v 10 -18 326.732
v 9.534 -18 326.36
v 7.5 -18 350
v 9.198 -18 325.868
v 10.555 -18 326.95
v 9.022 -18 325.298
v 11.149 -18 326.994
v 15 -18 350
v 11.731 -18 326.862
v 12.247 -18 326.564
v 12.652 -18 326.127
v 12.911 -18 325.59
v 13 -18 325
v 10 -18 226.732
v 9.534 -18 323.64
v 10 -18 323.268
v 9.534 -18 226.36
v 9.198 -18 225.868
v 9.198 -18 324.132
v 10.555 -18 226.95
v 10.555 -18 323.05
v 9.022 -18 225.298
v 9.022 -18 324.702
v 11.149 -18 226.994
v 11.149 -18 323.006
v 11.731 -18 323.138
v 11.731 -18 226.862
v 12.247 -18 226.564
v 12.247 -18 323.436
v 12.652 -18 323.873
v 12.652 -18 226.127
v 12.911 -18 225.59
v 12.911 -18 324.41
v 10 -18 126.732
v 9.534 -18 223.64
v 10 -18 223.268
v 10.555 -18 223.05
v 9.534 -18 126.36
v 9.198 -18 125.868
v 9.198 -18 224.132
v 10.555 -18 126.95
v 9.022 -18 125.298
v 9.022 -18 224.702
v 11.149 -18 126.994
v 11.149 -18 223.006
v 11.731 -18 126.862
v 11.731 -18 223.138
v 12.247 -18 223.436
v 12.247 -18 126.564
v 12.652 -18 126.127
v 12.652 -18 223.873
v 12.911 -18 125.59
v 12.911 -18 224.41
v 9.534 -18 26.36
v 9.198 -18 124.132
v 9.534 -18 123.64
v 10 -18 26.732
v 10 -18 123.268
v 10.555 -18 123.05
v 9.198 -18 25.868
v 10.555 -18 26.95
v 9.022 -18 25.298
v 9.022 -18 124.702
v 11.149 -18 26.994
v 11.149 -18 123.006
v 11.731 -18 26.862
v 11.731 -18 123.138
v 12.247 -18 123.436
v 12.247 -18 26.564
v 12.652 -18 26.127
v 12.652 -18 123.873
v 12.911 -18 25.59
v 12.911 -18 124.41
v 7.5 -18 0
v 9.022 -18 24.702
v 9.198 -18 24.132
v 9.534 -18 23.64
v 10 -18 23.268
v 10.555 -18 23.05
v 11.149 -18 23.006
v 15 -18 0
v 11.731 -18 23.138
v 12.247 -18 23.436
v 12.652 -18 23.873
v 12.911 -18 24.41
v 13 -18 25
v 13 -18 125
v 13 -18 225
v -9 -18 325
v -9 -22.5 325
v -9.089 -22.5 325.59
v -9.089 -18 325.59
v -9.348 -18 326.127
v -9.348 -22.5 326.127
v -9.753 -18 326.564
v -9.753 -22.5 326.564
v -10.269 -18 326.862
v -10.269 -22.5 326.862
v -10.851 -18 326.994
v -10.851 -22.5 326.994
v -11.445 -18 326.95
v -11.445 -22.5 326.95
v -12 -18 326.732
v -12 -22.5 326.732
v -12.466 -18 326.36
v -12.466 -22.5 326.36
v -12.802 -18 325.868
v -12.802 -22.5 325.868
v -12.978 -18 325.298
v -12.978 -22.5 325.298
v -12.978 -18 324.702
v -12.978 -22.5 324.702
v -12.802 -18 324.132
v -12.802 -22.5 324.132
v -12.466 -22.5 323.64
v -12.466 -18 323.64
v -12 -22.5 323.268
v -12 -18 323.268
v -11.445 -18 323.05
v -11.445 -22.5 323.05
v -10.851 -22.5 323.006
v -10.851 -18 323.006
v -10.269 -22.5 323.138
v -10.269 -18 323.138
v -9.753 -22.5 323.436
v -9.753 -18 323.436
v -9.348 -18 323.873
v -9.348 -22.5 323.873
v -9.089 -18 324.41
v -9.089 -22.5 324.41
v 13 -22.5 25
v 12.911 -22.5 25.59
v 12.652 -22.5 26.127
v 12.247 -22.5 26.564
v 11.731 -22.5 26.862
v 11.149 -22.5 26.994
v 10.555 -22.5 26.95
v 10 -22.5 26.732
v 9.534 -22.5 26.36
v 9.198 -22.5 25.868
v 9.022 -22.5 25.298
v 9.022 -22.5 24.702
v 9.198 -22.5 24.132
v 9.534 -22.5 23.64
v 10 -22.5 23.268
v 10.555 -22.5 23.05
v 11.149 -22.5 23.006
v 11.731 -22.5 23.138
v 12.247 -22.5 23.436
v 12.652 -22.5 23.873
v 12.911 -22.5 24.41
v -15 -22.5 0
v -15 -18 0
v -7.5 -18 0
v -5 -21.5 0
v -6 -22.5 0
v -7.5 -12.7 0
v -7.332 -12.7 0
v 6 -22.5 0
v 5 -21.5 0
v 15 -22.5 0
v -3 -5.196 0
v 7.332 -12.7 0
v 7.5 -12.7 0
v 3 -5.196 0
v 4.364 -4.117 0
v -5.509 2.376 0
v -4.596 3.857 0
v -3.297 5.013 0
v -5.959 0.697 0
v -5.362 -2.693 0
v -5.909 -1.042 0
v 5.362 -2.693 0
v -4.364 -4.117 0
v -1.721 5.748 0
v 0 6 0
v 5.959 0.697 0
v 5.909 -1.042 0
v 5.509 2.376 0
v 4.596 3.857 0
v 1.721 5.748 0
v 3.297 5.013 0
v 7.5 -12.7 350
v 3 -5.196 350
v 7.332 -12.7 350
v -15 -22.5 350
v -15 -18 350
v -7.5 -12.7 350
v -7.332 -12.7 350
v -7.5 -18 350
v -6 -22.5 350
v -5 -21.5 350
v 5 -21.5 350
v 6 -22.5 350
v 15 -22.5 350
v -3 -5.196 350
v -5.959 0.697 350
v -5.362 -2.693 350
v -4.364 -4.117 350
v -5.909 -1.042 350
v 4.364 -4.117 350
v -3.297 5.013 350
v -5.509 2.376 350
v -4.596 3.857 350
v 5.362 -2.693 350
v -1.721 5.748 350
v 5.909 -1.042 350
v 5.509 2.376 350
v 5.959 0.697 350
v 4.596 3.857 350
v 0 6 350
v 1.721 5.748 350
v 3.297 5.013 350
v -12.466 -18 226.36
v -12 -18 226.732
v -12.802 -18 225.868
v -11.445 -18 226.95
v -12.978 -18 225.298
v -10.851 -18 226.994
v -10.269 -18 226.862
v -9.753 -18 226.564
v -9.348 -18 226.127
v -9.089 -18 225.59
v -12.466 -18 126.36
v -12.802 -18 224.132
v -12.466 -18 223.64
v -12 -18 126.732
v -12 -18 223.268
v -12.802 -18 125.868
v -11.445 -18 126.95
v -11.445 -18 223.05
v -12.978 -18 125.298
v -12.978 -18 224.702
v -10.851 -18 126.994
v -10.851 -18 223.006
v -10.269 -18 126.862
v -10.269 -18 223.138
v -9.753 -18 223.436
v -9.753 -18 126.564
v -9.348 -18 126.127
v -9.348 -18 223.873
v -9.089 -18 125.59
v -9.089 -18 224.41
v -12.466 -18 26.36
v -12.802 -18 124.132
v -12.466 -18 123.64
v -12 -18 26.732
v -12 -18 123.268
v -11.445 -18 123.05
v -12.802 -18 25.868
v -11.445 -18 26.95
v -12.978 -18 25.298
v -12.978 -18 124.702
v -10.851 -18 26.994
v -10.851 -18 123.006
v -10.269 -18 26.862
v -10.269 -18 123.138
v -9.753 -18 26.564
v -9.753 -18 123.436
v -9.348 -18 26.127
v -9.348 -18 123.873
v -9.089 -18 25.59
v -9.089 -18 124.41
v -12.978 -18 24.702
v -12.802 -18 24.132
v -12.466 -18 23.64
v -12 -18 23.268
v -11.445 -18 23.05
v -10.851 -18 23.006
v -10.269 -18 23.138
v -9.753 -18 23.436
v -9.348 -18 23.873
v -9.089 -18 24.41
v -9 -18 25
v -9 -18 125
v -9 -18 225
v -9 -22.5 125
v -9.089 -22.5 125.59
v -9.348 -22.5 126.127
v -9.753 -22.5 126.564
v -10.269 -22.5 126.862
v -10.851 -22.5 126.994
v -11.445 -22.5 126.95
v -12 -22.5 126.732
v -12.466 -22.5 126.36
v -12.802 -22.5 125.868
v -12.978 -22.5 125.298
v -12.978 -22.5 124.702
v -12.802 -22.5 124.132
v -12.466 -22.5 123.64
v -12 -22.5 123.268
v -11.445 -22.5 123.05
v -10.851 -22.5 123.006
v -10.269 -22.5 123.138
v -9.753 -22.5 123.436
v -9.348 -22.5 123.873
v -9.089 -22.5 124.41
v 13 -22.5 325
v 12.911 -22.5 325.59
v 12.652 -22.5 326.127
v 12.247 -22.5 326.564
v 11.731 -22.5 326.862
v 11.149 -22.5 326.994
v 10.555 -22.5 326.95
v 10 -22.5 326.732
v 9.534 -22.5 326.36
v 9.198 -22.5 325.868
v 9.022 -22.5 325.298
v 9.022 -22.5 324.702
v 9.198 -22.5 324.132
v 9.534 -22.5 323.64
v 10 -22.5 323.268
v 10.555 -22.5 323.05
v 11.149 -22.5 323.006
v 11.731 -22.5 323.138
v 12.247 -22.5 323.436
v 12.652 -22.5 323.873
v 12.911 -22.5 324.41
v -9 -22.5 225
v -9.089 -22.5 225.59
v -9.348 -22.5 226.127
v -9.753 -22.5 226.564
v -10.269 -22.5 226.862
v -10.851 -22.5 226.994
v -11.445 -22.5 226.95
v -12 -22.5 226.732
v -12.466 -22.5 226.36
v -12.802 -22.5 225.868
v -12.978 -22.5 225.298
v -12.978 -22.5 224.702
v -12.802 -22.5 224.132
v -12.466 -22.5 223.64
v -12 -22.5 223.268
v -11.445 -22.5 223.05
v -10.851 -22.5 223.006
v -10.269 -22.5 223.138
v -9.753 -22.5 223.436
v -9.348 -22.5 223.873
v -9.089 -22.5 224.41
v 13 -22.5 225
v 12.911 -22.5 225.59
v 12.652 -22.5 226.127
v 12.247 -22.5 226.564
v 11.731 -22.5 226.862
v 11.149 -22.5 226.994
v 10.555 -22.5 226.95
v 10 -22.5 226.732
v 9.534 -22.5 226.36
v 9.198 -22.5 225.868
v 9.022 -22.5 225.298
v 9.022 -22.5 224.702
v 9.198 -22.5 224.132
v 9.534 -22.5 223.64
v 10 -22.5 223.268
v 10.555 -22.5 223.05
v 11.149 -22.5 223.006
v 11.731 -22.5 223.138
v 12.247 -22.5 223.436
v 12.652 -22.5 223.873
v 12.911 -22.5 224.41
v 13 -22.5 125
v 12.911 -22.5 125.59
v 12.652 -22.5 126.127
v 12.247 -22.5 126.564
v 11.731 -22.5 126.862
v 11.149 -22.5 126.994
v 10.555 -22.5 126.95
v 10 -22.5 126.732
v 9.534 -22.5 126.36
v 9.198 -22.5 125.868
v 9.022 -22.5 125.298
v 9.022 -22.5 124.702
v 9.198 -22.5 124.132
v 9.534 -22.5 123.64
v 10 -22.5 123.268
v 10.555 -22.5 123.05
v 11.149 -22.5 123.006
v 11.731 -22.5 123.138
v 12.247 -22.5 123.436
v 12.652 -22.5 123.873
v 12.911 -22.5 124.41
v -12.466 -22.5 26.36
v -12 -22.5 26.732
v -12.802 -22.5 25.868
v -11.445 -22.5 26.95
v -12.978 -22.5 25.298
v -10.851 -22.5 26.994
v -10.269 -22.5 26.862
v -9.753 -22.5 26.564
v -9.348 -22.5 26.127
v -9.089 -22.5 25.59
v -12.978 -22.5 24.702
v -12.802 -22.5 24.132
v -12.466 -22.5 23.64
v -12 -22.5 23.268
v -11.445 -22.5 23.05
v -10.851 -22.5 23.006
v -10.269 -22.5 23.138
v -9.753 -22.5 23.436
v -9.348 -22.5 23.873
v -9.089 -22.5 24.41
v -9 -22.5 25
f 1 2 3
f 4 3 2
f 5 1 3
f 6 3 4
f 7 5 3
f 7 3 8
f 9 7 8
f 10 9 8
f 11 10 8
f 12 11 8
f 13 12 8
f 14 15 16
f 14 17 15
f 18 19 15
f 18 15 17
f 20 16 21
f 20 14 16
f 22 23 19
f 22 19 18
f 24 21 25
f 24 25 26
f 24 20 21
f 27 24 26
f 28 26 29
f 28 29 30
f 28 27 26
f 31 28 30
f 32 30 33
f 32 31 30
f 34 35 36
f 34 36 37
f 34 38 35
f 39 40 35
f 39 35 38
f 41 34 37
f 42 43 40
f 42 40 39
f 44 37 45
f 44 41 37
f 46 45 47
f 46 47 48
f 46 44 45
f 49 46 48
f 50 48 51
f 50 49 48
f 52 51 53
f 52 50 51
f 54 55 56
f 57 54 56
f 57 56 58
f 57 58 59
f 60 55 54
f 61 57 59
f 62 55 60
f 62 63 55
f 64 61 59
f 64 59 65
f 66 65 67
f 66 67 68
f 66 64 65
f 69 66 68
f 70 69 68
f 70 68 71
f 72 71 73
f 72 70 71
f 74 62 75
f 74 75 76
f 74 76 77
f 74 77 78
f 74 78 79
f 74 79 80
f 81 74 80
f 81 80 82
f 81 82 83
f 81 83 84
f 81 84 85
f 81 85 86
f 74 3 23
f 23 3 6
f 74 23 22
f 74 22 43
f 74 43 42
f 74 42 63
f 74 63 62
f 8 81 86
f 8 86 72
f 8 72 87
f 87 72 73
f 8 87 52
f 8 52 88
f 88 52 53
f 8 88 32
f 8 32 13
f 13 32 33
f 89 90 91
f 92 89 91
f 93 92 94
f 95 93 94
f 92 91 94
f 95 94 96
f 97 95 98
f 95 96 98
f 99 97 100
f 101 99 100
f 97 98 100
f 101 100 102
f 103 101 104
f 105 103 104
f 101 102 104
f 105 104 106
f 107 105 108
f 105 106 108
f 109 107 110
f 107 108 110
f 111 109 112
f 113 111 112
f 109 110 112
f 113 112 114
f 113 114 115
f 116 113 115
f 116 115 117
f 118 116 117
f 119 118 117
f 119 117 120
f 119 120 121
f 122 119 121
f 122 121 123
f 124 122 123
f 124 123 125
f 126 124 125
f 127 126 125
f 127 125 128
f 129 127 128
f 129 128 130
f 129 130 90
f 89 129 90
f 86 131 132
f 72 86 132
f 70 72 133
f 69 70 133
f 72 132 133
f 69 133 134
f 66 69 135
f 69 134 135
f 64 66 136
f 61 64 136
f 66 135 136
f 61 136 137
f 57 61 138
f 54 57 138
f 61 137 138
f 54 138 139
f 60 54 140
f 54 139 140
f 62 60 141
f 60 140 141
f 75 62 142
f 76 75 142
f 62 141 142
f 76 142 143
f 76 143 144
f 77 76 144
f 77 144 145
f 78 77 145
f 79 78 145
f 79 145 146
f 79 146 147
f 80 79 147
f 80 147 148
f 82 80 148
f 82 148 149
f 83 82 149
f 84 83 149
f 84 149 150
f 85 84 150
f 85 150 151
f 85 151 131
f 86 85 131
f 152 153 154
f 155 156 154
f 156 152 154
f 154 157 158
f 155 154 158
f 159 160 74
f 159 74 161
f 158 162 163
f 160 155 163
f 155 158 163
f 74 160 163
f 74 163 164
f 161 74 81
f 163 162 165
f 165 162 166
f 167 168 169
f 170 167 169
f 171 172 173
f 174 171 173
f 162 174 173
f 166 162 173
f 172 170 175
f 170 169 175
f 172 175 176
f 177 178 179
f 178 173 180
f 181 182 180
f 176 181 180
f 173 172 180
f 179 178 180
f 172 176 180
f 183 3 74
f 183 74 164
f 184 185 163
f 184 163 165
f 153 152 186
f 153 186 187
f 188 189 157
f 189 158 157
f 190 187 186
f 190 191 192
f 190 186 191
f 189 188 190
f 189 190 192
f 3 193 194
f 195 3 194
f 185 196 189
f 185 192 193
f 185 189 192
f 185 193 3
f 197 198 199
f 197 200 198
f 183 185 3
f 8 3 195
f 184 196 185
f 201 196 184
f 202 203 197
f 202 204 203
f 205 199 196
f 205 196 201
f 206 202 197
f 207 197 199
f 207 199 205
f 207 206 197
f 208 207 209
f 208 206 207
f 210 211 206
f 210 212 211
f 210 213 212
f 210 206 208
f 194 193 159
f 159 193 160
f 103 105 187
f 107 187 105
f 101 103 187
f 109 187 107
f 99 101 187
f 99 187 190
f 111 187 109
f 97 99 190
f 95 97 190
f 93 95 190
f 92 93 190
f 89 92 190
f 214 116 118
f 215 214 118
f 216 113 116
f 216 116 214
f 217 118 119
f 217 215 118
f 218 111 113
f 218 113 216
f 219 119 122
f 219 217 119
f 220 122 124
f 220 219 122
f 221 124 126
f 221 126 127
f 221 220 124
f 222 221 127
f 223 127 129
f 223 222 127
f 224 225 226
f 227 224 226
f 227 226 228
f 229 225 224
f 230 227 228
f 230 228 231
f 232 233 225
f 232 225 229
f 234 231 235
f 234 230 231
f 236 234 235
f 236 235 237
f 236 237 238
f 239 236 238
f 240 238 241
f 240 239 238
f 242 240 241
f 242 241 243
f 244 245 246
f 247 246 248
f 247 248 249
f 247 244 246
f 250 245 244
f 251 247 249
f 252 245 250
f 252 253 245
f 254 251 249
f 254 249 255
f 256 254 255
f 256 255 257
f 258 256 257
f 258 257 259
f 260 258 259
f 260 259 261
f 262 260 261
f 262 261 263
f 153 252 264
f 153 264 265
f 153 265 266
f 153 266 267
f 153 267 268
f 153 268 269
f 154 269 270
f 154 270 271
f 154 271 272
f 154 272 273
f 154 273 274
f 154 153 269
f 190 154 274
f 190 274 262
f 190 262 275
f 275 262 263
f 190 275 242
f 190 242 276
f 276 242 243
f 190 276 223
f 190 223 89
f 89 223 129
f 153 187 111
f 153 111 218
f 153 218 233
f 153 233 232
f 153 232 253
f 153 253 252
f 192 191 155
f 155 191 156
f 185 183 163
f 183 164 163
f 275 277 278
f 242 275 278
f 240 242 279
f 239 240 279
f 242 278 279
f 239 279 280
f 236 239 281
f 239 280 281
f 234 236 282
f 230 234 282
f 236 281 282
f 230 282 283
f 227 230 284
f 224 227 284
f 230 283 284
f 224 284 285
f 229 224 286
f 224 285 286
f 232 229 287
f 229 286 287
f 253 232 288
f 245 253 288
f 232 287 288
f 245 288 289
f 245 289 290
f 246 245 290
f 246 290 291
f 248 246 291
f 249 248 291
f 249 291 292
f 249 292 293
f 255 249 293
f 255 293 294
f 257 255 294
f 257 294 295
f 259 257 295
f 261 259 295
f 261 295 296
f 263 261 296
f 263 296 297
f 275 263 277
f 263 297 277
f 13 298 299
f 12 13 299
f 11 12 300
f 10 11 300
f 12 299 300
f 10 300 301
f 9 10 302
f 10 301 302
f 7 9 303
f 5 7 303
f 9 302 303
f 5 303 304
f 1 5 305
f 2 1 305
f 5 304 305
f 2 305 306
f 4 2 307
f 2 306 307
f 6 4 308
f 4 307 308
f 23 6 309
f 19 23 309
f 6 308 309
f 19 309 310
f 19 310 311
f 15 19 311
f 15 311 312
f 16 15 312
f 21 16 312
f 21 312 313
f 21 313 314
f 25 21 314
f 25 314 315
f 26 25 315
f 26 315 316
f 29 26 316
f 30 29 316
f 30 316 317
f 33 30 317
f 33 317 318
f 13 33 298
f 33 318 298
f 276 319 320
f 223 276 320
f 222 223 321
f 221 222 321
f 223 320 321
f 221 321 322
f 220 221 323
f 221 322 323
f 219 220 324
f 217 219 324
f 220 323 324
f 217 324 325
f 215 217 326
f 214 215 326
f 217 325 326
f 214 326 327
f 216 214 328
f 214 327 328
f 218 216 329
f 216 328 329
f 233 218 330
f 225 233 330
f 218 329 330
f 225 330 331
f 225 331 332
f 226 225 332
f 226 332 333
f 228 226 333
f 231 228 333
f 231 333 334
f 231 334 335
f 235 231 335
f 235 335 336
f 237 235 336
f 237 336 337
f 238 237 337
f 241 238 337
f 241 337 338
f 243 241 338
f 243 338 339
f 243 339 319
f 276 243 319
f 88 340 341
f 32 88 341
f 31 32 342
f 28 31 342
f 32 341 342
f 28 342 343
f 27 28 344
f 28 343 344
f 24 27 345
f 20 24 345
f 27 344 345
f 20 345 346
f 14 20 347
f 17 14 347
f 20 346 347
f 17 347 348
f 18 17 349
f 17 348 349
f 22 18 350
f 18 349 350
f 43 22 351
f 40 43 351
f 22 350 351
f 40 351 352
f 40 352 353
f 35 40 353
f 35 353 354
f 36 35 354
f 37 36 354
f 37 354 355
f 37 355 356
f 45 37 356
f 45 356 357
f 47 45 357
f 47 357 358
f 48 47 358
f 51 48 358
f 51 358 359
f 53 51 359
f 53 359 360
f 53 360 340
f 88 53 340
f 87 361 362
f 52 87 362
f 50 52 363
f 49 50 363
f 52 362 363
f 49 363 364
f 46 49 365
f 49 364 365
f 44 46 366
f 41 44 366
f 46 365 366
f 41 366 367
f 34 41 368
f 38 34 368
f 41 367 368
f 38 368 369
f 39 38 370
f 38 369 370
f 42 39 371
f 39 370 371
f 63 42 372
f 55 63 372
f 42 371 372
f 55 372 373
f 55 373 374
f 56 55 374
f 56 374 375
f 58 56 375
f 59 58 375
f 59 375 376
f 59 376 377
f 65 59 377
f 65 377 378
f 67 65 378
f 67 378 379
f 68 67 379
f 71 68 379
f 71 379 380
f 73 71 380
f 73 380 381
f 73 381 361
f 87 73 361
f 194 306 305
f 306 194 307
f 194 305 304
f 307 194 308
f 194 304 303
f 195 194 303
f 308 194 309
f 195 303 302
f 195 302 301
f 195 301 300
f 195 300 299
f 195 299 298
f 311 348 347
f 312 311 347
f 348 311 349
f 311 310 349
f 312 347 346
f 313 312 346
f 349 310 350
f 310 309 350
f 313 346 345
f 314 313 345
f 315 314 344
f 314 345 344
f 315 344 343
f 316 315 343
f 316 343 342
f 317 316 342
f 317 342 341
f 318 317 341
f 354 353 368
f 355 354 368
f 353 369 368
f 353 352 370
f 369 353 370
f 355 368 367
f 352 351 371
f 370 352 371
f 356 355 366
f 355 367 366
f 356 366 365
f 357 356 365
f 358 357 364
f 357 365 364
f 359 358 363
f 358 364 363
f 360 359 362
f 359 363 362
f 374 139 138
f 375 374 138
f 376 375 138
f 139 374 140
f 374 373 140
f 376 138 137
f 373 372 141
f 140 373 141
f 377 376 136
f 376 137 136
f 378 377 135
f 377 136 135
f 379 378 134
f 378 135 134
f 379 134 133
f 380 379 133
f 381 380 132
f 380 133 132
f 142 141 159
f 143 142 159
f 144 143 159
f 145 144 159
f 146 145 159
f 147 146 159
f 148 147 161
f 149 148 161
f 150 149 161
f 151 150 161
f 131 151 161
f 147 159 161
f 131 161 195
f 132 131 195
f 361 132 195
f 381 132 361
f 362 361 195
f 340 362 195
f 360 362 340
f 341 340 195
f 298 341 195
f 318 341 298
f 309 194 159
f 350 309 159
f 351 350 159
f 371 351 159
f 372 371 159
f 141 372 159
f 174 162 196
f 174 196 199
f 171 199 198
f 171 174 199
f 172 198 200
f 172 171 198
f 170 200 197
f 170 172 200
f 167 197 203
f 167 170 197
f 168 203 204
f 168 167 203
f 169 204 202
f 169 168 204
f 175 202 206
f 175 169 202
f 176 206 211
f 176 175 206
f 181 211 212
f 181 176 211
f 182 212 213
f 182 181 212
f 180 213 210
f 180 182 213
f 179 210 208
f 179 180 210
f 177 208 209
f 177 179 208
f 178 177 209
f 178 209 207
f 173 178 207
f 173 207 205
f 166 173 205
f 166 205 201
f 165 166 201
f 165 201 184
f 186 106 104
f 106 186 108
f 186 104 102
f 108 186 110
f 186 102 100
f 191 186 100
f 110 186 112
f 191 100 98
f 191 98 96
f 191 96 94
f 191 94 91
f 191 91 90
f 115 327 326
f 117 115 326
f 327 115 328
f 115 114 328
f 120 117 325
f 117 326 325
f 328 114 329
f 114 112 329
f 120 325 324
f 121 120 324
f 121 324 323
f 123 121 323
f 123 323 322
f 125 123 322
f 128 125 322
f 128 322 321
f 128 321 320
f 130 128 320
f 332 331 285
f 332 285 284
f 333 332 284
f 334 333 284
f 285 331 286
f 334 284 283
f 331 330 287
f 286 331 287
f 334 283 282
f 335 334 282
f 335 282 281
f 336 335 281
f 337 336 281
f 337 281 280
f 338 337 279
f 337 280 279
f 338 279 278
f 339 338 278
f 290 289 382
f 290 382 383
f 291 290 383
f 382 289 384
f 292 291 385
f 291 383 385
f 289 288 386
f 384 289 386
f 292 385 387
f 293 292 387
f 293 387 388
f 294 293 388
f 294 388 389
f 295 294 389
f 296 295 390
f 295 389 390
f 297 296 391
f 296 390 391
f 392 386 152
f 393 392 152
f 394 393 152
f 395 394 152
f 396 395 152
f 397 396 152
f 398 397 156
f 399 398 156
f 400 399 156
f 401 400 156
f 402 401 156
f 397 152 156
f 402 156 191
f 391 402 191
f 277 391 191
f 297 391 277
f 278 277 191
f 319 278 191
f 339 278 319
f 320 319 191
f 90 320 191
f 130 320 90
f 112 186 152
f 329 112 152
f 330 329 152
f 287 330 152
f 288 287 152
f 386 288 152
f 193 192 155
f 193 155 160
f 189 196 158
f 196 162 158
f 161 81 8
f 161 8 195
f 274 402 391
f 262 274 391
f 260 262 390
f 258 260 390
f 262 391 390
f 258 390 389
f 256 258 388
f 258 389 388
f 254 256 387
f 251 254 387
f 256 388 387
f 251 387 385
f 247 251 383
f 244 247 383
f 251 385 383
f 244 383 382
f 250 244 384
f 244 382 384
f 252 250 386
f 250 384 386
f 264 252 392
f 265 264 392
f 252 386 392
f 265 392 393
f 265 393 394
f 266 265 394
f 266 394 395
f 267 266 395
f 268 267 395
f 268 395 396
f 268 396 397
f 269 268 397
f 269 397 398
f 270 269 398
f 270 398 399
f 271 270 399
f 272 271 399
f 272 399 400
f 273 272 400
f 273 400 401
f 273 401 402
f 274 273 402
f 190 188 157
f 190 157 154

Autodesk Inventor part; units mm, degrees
ref_plane "YZ Plane" through (0, 0, 0) normal (1, 0, 0) x (0, 1, 0)
ref_plane "XZ Plane" through (0, 0, 0) normal (0, 1, 0) x (-1, 0, 0)
ref_plane "XY Plane" through (0, 0, 0) normal (0, 0, 1) x (1, 0, 0)
sketch "Sketch1" plane through (0, 0, 0) normal (0, 0, 1) x (1, 0, 0)
  circle A0 centre (0, 0) radius 6
  line L0 (-3, -5.1962) -> (-7.3323, -12.7)
  line L1 (-7.3323, -12.7) -> (7.3323, -12.7)
  line L2 (7.3323, -12.7) -> (3, -5.1962)
  line L3 (-7.5, -22.5) -> (7.5, -22.5)
  line L4 (7.5, -22.5) -> (7.5, -12.7)
  line L5 (7.5, -12.7) -> (-7.5, -12.7)
  line L6 (-7.5, -12.7) -> (-7.5, -22.5)
  line L7 (0, -12.7) -> (0, 0)
  line L8 (-15, -18) -> (15, -18)
  line L9 (15, -18) -> (15, -22.5)
  line L10 (15, -22.5) -> (-15, -22.5)
  line L11 (-15, -22.5) -> (-15, -18)
  point P0 (0, -22.5)
  dimension "d0" = 12
  dimension "d1" = 60
  dimension "d2" = 3
  dimension "d3" = 3
  dimension "d4" = 15
  dimension "d5" = 9.8
  dimension "d7" = 4.5
  dimension "d8" = 30
  dimension "d31" = 22.5
extrude "Extrusion1" add sketch "Sketch1" along normal blind 350
sketch "Sketch2" plane through (0, 0, 350) normal (0, 0, 1) x (1, 0, 0)
  arc A0 (3, -5.1962) -> (-3, -5.1962) centre (0, 0) ccw projected
  line L0 (3, -5.1962) -> (7.3323, -12.7) projected
  line L1 (7.3323, -12.7) -> (7.5, -12.7) projected
  line L2 (7.5, -12.7) -> (7.5, -18) projected
  line L3 (7.5, -18) -> (15, -18) projected
  line L4 (15, -18) -> (15, -22.5) projected
  line L5 (15, -22.5) -> (-15, -22.5) projected
  line L6 (-15, -22.5) -> (-15, -18) projected
  line L7 (-15, -18) -> (-7.5, -18) projected
  line L8 (-7.5, -18) -> (-7.5, -12.7) projected
  line L9 (-7.5, -12.7) -> (-7.3323, -12.7) projected
  line L10 (-7.3323, -12.7) -> (-3, -5.1962) projected
  line L11 (-6, -21.5) -> (6, -21.5)
  line L12 (6, -21.5) -> (6, -22.5)
  line L13 (6, -22.5) -> (-6, -22.5)
  line L14 (-6, -22.5) -> (-6, -21.5)
  point P0 (0, -22.5)
  dimension "d11" = 12
  dimension "d12" = 1
extrude "Extrusion2" cut sketch "Sketch2" against normal through all contours L5 L14 L11 L12
chamfer "Chamfer1" distance 1 angle 45 2 edges at (-6, -21.5, 175) (6, -21.5, 175)
sketch "Sketch3" plane through (-15, -22.5, 0) normal (0, -1, 0) x (1, 0, 0)
  line L0 (21, 0) -> (21, 350) construction
  line L1 (21, 350) -> (30, 350) projected
  line L2 (30, 350) -> (30, 0) projected
  line L3 (30, 0) -> (21, 0) construction
  line L4 (9, 350) -> (9, 0) construction
  line L5 (9, 0) -> (0, 0) construction
  line L6 (0, 0) -> (0, 350) projected
  line L7 (0, 350) -> (9, 350) projected
  circle A0 centre (4, 25) radius 2
  circle A1 centre (26, 25) radius 2
  line L8 (26, 25) -> (4, 25) construction
  line L9 (15, 25) -> (15, 0) construction
  dimension "d18" = 25
  dimension "d19" = 4
  dimension "d20" = 4
  dimension "d21" = 22
extrude "Extrusion3" cut sketch "Sketch3" against normal through all
thread "Thread1" size "M4x0.7" class "6H" standard "ANSI Metric M Profile" full length
thread "Thread2" size "M4x0.7" class "6H" standard "ANSI Metric M Profile" full length
pattern_linear "Rectangular Pattern1" count 4 spacing 100 along (0, 0, 1) of "Extrusion3"
properties part number "sbr12_350mm"
